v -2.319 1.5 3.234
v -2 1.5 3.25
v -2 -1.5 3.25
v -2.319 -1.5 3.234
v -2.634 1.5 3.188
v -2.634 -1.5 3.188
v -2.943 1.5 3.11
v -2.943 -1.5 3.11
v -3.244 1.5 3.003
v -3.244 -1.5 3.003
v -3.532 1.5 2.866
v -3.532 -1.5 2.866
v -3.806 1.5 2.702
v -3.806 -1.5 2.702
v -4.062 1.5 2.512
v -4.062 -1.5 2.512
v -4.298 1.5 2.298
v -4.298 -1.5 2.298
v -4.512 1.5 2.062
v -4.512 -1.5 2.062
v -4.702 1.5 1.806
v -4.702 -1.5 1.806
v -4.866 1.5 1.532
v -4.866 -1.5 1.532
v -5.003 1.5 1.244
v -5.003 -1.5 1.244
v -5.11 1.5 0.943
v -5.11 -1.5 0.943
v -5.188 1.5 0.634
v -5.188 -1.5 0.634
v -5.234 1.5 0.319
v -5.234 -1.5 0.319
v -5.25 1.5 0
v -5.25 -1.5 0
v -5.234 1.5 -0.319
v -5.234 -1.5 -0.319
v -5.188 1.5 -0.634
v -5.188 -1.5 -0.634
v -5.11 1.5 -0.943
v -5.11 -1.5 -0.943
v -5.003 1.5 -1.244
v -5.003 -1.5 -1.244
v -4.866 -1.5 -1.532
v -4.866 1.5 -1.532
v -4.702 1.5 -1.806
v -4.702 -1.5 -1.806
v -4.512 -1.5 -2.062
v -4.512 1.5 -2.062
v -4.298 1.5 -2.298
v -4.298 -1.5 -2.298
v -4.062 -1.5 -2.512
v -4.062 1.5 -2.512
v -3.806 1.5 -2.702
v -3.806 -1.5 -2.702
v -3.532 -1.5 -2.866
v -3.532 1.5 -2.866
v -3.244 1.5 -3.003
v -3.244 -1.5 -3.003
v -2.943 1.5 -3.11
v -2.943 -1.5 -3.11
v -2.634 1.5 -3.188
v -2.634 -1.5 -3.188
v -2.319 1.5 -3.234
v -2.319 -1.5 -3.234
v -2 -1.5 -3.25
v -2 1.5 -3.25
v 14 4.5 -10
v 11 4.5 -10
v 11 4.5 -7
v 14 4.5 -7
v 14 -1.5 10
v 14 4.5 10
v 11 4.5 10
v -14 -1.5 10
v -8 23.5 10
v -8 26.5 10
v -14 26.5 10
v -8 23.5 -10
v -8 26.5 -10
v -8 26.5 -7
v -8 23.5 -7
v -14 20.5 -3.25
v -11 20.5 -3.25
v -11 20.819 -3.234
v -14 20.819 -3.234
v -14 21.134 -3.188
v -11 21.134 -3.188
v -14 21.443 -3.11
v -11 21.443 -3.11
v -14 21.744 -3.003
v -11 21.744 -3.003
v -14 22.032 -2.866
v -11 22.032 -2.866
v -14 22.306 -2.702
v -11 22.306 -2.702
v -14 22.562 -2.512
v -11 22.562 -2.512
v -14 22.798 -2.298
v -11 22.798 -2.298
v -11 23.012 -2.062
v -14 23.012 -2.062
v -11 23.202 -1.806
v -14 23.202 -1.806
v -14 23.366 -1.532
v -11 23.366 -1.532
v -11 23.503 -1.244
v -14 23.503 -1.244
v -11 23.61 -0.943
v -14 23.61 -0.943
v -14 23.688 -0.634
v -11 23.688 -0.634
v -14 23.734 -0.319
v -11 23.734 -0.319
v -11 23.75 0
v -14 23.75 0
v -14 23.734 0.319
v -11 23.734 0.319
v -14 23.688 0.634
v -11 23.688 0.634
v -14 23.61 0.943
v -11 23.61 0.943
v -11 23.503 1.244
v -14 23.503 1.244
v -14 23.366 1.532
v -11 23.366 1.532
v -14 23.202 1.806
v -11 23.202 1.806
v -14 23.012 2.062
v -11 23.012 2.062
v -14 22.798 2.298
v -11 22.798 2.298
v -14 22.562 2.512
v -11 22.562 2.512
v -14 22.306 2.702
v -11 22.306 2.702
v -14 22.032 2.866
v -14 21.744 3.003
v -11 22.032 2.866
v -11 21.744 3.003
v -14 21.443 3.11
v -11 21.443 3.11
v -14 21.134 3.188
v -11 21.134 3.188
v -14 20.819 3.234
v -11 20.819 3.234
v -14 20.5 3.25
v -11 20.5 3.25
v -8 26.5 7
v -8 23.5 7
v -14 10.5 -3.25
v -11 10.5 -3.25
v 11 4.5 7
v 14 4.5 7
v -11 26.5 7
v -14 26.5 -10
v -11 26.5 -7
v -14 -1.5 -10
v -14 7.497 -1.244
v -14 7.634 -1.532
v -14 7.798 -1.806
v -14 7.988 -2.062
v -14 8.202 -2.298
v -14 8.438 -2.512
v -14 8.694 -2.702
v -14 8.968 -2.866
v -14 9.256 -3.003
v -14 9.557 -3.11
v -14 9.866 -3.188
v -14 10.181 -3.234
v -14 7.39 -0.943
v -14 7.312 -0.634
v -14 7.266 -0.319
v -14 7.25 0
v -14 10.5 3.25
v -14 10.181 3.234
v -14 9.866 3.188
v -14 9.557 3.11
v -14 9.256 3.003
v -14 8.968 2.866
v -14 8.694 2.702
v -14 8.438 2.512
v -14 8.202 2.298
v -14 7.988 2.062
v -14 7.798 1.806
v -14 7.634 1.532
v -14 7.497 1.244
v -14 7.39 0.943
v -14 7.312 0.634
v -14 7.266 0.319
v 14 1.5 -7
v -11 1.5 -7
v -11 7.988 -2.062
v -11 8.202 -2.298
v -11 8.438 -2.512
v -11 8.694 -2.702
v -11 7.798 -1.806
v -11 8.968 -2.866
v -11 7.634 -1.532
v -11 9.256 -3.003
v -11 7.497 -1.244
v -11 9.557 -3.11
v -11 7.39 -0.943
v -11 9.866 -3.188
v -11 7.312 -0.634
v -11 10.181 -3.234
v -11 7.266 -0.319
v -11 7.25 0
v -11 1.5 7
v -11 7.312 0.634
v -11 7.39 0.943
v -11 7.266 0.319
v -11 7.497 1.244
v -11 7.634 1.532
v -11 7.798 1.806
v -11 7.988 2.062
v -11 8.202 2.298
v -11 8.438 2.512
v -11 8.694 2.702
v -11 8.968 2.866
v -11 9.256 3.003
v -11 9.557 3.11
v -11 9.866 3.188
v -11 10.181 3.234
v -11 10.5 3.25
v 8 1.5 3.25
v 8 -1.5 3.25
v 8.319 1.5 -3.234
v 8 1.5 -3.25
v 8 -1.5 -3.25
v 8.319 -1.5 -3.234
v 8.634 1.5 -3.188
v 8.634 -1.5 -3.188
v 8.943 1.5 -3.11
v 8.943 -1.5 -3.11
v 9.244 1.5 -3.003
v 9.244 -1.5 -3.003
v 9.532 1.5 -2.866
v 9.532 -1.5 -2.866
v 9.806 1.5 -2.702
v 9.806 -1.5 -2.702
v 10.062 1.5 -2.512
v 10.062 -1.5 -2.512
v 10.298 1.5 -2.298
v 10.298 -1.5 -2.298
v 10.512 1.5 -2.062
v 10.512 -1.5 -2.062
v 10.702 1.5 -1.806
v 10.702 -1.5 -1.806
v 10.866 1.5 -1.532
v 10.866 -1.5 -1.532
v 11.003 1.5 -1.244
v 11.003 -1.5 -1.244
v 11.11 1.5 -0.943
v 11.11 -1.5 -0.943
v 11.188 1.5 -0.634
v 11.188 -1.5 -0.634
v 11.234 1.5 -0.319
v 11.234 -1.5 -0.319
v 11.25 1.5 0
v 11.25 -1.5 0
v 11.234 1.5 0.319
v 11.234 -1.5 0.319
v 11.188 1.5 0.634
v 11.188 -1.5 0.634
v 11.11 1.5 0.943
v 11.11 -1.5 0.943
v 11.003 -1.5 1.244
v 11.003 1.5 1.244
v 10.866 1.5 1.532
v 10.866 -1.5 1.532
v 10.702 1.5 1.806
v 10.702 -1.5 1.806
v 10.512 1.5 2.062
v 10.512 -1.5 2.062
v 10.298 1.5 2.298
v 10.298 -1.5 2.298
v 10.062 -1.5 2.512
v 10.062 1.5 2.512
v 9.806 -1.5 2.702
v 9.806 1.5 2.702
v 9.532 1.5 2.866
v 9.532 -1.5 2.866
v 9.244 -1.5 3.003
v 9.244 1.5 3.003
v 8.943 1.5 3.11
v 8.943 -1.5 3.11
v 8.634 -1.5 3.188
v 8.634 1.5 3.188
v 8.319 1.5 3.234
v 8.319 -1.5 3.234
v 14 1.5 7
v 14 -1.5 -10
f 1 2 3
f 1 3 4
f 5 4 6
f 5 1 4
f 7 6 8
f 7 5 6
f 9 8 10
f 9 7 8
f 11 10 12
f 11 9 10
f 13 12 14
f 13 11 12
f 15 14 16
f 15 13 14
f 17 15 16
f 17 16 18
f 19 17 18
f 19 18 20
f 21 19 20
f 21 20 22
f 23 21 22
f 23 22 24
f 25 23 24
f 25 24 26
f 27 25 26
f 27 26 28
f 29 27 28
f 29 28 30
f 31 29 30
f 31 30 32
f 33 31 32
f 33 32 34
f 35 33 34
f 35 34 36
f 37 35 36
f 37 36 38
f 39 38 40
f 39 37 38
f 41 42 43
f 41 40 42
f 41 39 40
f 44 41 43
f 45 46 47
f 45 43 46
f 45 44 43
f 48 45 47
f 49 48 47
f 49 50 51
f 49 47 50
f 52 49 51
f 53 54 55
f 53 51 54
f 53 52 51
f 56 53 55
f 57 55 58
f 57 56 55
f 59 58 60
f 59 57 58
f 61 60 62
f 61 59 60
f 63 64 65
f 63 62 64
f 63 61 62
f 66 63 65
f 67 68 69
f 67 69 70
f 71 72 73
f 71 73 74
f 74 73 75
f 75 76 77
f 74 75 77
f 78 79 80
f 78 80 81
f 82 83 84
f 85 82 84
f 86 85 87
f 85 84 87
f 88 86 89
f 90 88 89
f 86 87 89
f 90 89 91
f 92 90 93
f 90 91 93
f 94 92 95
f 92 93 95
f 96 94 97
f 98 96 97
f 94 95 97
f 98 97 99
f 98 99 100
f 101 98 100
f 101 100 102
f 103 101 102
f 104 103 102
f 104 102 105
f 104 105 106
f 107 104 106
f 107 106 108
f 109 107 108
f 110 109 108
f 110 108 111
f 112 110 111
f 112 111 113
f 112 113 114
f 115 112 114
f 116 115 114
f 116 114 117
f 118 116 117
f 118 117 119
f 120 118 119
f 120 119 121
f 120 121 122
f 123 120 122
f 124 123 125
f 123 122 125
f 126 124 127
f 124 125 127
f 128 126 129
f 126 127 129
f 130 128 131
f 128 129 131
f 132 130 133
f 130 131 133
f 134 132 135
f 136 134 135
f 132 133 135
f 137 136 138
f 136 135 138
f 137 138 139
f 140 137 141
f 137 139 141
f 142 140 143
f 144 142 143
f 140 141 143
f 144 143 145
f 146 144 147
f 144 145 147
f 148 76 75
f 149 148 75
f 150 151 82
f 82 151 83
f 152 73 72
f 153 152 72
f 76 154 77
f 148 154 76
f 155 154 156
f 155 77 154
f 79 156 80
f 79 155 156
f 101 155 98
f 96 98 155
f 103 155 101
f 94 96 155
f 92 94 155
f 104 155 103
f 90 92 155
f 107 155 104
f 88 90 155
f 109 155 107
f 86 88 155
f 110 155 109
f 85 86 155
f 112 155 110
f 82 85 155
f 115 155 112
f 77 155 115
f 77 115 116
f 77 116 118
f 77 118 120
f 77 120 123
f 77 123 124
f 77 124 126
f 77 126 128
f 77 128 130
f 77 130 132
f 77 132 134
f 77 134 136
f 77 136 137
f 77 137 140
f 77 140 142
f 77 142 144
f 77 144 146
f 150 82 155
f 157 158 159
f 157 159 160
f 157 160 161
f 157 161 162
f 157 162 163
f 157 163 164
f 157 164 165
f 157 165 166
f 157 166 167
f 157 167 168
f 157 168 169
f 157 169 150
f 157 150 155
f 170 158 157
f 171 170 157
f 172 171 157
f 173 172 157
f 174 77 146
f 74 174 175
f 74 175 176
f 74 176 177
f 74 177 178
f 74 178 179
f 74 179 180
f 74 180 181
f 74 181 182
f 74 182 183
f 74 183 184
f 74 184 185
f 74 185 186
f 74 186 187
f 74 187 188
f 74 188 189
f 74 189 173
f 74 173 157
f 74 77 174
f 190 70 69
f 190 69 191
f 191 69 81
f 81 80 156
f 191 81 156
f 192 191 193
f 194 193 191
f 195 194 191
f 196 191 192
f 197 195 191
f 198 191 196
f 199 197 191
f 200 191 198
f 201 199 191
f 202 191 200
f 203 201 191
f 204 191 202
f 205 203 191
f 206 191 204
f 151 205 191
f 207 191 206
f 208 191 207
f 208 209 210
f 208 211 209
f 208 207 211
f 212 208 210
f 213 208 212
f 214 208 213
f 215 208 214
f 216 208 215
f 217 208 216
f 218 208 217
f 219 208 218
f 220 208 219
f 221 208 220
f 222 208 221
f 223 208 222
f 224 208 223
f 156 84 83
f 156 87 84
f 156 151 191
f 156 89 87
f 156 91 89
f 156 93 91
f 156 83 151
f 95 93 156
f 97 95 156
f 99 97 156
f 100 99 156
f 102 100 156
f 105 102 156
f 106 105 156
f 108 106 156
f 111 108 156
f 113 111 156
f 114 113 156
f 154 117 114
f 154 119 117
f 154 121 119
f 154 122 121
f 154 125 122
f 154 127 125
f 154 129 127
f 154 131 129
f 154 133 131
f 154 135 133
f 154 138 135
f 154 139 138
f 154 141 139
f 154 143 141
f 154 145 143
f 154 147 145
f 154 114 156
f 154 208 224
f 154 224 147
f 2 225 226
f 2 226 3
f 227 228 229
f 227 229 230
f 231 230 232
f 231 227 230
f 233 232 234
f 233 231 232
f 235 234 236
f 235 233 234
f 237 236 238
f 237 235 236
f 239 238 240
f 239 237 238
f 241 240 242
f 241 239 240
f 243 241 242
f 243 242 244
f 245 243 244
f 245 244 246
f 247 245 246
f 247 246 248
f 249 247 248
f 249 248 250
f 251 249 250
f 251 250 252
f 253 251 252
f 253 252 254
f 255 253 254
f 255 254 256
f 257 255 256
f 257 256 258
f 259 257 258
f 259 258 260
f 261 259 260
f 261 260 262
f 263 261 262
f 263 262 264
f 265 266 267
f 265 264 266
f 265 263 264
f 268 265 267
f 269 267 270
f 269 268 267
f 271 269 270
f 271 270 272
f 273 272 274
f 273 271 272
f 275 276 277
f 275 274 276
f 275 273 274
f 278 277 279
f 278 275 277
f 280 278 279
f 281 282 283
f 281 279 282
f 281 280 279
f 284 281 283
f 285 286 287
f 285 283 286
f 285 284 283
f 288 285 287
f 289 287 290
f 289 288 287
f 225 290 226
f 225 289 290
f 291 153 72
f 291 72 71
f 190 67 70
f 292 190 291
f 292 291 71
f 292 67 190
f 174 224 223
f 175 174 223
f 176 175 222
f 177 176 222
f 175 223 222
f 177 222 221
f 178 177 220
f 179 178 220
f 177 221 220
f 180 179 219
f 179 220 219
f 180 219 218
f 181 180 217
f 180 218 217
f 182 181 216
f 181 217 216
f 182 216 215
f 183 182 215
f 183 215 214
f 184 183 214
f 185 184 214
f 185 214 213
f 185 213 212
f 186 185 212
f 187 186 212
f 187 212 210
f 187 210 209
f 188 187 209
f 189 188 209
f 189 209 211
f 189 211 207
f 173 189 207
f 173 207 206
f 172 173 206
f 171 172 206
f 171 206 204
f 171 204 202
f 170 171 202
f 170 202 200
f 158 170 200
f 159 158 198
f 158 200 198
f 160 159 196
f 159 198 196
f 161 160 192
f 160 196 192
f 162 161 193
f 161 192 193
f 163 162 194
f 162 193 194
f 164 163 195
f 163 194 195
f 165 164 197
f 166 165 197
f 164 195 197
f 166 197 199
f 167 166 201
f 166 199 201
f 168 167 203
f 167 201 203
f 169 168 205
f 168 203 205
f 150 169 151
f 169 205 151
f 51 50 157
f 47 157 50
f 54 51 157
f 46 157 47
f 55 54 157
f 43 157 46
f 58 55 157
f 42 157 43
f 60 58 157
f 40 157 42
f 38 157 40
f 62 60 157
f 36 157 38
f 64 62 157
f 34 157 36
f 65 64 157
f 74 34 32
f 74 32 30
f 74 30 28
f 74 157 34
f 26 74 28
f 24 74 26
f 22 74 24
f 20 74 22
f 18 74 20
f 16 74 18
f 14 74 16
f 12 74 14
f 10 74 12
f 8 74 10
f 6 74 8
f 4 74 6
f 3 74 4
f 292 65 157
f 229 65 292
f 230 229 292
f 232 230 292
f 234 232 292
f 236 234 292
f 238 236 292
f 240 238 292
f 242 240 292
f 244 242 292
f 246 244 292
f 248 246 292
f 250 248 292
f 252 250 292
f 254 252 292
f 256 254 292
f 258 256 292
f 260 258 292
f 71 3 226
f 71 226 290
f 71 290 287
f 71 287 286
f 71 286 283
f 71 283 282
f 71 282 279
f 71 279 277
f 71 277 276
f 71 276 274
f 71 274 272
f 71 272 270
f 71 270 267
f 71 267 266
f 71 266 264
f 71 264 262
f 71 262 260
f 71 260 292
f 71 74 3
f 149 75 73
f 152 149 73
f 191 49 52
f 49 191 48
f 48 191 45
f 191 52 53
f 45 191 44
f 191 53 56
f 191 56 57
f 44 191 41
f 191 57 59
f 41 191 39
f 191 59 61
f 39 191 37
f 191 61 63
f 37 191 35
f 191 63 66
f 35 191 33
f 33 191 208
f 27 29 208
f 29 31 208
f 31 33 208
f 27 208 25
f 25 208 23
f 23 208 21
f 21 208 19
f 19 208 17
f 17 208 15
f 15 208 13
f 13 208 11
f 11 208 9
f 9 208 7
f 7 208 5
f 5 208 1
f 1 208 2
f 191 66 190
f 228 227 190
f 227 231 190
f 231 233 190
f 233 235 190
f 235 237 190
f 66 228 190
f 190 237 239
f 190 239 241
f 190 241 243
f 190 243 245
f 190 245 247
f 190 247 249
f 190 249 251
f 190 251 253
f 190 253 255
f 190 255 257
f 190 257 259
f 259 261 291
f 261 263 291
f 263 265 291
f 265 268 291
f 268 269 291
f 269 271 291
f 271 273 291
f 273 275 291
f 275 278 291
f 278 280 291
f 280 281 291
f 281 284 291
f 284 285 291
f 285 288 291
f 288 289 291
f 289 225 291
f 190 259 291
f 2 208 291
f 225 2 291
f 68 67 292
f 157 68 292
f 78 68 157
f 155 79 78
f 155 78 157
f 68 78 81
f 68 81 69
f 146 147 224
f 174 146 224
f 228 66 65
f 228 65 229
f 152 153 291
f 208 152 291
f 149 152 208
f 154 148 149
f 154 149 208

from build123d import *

# Parameters (mm, degrees)
SKETCH1_W           = 28
SKETCH1_H           = 3
SKETCH1_W_2         = 3
SKETCH1_H_2         = 25
BOSS_EXTRUDE1_DEPTH = 10
CUT_EXTRUDE1_DEPTH  = 31.347981811
BOSS_EXTRUDE2_DEPTH = 3


with BuildPart() as part:
    # Sketch1 → Boss-Extrude1 (new, symmetric)
    with BuildSketch(Plane.XY):
        Rectangle(SKETCH1_W, SKETCH1_H)
        with Locations((-12.5, 14)):
            Rectangle(SKETCH1_W_2, SKETCH1_H_2)
    extrude(amount=BOSS_EXTRUDE1_DEPTH, both=True)

    # Sketch3 → Cut-Extrude1 (cut, through all)
    with BuildSketch(Plane(origin=(0, 1.5, 0), x_dir=(1, 0, 0), z_dir=(0, 1, 0))):
        with BuildLine():
            Line((8, -3.25), (-2, -3.25))
            ThreePointArc((-2, -3.25), (-5.25, 0), (-2, 3.25))
            Line((-2, 3.25), (8, 3.25))
            ThreePointArc((8, 3.25), (11.25, 0), (8, -3.25))
        make_face()
    cut_extrude1 = extrude(amount=-CUT_EXTRUDE1_DEPTH, mode=Mode.SUBTRACT)

    # Mirror1: Cut-Extrude1 across plane
    add(cut_extrude1.mirror(Plane(origin=(-6.25, 6.25, 0), x_dir=(0, 0, 1), z_dir=(-0.7071067811865479, 0.7071067811865471, 0))), mode=Mode.SUBTRACT)

    # Sketch4 → Boss-Extrude2 (add)
    with BuildSketch(Plane.XY.offset(10)):
        Polygon((-11, 26.5), (-8, 26.5), (-8, 23.5), (11, 4.5), (14, 4.5), (14, 1.5), (-11, 1.5), align=None)
    boss_extrude2 = extrude(amount=-BOSS_EXTRUDE2_DEPTH)

    # Mirror2: Boss-Extrude2 across plane
    add(boss_extrude2.mirror(Plane.XY))


solid = part.part
